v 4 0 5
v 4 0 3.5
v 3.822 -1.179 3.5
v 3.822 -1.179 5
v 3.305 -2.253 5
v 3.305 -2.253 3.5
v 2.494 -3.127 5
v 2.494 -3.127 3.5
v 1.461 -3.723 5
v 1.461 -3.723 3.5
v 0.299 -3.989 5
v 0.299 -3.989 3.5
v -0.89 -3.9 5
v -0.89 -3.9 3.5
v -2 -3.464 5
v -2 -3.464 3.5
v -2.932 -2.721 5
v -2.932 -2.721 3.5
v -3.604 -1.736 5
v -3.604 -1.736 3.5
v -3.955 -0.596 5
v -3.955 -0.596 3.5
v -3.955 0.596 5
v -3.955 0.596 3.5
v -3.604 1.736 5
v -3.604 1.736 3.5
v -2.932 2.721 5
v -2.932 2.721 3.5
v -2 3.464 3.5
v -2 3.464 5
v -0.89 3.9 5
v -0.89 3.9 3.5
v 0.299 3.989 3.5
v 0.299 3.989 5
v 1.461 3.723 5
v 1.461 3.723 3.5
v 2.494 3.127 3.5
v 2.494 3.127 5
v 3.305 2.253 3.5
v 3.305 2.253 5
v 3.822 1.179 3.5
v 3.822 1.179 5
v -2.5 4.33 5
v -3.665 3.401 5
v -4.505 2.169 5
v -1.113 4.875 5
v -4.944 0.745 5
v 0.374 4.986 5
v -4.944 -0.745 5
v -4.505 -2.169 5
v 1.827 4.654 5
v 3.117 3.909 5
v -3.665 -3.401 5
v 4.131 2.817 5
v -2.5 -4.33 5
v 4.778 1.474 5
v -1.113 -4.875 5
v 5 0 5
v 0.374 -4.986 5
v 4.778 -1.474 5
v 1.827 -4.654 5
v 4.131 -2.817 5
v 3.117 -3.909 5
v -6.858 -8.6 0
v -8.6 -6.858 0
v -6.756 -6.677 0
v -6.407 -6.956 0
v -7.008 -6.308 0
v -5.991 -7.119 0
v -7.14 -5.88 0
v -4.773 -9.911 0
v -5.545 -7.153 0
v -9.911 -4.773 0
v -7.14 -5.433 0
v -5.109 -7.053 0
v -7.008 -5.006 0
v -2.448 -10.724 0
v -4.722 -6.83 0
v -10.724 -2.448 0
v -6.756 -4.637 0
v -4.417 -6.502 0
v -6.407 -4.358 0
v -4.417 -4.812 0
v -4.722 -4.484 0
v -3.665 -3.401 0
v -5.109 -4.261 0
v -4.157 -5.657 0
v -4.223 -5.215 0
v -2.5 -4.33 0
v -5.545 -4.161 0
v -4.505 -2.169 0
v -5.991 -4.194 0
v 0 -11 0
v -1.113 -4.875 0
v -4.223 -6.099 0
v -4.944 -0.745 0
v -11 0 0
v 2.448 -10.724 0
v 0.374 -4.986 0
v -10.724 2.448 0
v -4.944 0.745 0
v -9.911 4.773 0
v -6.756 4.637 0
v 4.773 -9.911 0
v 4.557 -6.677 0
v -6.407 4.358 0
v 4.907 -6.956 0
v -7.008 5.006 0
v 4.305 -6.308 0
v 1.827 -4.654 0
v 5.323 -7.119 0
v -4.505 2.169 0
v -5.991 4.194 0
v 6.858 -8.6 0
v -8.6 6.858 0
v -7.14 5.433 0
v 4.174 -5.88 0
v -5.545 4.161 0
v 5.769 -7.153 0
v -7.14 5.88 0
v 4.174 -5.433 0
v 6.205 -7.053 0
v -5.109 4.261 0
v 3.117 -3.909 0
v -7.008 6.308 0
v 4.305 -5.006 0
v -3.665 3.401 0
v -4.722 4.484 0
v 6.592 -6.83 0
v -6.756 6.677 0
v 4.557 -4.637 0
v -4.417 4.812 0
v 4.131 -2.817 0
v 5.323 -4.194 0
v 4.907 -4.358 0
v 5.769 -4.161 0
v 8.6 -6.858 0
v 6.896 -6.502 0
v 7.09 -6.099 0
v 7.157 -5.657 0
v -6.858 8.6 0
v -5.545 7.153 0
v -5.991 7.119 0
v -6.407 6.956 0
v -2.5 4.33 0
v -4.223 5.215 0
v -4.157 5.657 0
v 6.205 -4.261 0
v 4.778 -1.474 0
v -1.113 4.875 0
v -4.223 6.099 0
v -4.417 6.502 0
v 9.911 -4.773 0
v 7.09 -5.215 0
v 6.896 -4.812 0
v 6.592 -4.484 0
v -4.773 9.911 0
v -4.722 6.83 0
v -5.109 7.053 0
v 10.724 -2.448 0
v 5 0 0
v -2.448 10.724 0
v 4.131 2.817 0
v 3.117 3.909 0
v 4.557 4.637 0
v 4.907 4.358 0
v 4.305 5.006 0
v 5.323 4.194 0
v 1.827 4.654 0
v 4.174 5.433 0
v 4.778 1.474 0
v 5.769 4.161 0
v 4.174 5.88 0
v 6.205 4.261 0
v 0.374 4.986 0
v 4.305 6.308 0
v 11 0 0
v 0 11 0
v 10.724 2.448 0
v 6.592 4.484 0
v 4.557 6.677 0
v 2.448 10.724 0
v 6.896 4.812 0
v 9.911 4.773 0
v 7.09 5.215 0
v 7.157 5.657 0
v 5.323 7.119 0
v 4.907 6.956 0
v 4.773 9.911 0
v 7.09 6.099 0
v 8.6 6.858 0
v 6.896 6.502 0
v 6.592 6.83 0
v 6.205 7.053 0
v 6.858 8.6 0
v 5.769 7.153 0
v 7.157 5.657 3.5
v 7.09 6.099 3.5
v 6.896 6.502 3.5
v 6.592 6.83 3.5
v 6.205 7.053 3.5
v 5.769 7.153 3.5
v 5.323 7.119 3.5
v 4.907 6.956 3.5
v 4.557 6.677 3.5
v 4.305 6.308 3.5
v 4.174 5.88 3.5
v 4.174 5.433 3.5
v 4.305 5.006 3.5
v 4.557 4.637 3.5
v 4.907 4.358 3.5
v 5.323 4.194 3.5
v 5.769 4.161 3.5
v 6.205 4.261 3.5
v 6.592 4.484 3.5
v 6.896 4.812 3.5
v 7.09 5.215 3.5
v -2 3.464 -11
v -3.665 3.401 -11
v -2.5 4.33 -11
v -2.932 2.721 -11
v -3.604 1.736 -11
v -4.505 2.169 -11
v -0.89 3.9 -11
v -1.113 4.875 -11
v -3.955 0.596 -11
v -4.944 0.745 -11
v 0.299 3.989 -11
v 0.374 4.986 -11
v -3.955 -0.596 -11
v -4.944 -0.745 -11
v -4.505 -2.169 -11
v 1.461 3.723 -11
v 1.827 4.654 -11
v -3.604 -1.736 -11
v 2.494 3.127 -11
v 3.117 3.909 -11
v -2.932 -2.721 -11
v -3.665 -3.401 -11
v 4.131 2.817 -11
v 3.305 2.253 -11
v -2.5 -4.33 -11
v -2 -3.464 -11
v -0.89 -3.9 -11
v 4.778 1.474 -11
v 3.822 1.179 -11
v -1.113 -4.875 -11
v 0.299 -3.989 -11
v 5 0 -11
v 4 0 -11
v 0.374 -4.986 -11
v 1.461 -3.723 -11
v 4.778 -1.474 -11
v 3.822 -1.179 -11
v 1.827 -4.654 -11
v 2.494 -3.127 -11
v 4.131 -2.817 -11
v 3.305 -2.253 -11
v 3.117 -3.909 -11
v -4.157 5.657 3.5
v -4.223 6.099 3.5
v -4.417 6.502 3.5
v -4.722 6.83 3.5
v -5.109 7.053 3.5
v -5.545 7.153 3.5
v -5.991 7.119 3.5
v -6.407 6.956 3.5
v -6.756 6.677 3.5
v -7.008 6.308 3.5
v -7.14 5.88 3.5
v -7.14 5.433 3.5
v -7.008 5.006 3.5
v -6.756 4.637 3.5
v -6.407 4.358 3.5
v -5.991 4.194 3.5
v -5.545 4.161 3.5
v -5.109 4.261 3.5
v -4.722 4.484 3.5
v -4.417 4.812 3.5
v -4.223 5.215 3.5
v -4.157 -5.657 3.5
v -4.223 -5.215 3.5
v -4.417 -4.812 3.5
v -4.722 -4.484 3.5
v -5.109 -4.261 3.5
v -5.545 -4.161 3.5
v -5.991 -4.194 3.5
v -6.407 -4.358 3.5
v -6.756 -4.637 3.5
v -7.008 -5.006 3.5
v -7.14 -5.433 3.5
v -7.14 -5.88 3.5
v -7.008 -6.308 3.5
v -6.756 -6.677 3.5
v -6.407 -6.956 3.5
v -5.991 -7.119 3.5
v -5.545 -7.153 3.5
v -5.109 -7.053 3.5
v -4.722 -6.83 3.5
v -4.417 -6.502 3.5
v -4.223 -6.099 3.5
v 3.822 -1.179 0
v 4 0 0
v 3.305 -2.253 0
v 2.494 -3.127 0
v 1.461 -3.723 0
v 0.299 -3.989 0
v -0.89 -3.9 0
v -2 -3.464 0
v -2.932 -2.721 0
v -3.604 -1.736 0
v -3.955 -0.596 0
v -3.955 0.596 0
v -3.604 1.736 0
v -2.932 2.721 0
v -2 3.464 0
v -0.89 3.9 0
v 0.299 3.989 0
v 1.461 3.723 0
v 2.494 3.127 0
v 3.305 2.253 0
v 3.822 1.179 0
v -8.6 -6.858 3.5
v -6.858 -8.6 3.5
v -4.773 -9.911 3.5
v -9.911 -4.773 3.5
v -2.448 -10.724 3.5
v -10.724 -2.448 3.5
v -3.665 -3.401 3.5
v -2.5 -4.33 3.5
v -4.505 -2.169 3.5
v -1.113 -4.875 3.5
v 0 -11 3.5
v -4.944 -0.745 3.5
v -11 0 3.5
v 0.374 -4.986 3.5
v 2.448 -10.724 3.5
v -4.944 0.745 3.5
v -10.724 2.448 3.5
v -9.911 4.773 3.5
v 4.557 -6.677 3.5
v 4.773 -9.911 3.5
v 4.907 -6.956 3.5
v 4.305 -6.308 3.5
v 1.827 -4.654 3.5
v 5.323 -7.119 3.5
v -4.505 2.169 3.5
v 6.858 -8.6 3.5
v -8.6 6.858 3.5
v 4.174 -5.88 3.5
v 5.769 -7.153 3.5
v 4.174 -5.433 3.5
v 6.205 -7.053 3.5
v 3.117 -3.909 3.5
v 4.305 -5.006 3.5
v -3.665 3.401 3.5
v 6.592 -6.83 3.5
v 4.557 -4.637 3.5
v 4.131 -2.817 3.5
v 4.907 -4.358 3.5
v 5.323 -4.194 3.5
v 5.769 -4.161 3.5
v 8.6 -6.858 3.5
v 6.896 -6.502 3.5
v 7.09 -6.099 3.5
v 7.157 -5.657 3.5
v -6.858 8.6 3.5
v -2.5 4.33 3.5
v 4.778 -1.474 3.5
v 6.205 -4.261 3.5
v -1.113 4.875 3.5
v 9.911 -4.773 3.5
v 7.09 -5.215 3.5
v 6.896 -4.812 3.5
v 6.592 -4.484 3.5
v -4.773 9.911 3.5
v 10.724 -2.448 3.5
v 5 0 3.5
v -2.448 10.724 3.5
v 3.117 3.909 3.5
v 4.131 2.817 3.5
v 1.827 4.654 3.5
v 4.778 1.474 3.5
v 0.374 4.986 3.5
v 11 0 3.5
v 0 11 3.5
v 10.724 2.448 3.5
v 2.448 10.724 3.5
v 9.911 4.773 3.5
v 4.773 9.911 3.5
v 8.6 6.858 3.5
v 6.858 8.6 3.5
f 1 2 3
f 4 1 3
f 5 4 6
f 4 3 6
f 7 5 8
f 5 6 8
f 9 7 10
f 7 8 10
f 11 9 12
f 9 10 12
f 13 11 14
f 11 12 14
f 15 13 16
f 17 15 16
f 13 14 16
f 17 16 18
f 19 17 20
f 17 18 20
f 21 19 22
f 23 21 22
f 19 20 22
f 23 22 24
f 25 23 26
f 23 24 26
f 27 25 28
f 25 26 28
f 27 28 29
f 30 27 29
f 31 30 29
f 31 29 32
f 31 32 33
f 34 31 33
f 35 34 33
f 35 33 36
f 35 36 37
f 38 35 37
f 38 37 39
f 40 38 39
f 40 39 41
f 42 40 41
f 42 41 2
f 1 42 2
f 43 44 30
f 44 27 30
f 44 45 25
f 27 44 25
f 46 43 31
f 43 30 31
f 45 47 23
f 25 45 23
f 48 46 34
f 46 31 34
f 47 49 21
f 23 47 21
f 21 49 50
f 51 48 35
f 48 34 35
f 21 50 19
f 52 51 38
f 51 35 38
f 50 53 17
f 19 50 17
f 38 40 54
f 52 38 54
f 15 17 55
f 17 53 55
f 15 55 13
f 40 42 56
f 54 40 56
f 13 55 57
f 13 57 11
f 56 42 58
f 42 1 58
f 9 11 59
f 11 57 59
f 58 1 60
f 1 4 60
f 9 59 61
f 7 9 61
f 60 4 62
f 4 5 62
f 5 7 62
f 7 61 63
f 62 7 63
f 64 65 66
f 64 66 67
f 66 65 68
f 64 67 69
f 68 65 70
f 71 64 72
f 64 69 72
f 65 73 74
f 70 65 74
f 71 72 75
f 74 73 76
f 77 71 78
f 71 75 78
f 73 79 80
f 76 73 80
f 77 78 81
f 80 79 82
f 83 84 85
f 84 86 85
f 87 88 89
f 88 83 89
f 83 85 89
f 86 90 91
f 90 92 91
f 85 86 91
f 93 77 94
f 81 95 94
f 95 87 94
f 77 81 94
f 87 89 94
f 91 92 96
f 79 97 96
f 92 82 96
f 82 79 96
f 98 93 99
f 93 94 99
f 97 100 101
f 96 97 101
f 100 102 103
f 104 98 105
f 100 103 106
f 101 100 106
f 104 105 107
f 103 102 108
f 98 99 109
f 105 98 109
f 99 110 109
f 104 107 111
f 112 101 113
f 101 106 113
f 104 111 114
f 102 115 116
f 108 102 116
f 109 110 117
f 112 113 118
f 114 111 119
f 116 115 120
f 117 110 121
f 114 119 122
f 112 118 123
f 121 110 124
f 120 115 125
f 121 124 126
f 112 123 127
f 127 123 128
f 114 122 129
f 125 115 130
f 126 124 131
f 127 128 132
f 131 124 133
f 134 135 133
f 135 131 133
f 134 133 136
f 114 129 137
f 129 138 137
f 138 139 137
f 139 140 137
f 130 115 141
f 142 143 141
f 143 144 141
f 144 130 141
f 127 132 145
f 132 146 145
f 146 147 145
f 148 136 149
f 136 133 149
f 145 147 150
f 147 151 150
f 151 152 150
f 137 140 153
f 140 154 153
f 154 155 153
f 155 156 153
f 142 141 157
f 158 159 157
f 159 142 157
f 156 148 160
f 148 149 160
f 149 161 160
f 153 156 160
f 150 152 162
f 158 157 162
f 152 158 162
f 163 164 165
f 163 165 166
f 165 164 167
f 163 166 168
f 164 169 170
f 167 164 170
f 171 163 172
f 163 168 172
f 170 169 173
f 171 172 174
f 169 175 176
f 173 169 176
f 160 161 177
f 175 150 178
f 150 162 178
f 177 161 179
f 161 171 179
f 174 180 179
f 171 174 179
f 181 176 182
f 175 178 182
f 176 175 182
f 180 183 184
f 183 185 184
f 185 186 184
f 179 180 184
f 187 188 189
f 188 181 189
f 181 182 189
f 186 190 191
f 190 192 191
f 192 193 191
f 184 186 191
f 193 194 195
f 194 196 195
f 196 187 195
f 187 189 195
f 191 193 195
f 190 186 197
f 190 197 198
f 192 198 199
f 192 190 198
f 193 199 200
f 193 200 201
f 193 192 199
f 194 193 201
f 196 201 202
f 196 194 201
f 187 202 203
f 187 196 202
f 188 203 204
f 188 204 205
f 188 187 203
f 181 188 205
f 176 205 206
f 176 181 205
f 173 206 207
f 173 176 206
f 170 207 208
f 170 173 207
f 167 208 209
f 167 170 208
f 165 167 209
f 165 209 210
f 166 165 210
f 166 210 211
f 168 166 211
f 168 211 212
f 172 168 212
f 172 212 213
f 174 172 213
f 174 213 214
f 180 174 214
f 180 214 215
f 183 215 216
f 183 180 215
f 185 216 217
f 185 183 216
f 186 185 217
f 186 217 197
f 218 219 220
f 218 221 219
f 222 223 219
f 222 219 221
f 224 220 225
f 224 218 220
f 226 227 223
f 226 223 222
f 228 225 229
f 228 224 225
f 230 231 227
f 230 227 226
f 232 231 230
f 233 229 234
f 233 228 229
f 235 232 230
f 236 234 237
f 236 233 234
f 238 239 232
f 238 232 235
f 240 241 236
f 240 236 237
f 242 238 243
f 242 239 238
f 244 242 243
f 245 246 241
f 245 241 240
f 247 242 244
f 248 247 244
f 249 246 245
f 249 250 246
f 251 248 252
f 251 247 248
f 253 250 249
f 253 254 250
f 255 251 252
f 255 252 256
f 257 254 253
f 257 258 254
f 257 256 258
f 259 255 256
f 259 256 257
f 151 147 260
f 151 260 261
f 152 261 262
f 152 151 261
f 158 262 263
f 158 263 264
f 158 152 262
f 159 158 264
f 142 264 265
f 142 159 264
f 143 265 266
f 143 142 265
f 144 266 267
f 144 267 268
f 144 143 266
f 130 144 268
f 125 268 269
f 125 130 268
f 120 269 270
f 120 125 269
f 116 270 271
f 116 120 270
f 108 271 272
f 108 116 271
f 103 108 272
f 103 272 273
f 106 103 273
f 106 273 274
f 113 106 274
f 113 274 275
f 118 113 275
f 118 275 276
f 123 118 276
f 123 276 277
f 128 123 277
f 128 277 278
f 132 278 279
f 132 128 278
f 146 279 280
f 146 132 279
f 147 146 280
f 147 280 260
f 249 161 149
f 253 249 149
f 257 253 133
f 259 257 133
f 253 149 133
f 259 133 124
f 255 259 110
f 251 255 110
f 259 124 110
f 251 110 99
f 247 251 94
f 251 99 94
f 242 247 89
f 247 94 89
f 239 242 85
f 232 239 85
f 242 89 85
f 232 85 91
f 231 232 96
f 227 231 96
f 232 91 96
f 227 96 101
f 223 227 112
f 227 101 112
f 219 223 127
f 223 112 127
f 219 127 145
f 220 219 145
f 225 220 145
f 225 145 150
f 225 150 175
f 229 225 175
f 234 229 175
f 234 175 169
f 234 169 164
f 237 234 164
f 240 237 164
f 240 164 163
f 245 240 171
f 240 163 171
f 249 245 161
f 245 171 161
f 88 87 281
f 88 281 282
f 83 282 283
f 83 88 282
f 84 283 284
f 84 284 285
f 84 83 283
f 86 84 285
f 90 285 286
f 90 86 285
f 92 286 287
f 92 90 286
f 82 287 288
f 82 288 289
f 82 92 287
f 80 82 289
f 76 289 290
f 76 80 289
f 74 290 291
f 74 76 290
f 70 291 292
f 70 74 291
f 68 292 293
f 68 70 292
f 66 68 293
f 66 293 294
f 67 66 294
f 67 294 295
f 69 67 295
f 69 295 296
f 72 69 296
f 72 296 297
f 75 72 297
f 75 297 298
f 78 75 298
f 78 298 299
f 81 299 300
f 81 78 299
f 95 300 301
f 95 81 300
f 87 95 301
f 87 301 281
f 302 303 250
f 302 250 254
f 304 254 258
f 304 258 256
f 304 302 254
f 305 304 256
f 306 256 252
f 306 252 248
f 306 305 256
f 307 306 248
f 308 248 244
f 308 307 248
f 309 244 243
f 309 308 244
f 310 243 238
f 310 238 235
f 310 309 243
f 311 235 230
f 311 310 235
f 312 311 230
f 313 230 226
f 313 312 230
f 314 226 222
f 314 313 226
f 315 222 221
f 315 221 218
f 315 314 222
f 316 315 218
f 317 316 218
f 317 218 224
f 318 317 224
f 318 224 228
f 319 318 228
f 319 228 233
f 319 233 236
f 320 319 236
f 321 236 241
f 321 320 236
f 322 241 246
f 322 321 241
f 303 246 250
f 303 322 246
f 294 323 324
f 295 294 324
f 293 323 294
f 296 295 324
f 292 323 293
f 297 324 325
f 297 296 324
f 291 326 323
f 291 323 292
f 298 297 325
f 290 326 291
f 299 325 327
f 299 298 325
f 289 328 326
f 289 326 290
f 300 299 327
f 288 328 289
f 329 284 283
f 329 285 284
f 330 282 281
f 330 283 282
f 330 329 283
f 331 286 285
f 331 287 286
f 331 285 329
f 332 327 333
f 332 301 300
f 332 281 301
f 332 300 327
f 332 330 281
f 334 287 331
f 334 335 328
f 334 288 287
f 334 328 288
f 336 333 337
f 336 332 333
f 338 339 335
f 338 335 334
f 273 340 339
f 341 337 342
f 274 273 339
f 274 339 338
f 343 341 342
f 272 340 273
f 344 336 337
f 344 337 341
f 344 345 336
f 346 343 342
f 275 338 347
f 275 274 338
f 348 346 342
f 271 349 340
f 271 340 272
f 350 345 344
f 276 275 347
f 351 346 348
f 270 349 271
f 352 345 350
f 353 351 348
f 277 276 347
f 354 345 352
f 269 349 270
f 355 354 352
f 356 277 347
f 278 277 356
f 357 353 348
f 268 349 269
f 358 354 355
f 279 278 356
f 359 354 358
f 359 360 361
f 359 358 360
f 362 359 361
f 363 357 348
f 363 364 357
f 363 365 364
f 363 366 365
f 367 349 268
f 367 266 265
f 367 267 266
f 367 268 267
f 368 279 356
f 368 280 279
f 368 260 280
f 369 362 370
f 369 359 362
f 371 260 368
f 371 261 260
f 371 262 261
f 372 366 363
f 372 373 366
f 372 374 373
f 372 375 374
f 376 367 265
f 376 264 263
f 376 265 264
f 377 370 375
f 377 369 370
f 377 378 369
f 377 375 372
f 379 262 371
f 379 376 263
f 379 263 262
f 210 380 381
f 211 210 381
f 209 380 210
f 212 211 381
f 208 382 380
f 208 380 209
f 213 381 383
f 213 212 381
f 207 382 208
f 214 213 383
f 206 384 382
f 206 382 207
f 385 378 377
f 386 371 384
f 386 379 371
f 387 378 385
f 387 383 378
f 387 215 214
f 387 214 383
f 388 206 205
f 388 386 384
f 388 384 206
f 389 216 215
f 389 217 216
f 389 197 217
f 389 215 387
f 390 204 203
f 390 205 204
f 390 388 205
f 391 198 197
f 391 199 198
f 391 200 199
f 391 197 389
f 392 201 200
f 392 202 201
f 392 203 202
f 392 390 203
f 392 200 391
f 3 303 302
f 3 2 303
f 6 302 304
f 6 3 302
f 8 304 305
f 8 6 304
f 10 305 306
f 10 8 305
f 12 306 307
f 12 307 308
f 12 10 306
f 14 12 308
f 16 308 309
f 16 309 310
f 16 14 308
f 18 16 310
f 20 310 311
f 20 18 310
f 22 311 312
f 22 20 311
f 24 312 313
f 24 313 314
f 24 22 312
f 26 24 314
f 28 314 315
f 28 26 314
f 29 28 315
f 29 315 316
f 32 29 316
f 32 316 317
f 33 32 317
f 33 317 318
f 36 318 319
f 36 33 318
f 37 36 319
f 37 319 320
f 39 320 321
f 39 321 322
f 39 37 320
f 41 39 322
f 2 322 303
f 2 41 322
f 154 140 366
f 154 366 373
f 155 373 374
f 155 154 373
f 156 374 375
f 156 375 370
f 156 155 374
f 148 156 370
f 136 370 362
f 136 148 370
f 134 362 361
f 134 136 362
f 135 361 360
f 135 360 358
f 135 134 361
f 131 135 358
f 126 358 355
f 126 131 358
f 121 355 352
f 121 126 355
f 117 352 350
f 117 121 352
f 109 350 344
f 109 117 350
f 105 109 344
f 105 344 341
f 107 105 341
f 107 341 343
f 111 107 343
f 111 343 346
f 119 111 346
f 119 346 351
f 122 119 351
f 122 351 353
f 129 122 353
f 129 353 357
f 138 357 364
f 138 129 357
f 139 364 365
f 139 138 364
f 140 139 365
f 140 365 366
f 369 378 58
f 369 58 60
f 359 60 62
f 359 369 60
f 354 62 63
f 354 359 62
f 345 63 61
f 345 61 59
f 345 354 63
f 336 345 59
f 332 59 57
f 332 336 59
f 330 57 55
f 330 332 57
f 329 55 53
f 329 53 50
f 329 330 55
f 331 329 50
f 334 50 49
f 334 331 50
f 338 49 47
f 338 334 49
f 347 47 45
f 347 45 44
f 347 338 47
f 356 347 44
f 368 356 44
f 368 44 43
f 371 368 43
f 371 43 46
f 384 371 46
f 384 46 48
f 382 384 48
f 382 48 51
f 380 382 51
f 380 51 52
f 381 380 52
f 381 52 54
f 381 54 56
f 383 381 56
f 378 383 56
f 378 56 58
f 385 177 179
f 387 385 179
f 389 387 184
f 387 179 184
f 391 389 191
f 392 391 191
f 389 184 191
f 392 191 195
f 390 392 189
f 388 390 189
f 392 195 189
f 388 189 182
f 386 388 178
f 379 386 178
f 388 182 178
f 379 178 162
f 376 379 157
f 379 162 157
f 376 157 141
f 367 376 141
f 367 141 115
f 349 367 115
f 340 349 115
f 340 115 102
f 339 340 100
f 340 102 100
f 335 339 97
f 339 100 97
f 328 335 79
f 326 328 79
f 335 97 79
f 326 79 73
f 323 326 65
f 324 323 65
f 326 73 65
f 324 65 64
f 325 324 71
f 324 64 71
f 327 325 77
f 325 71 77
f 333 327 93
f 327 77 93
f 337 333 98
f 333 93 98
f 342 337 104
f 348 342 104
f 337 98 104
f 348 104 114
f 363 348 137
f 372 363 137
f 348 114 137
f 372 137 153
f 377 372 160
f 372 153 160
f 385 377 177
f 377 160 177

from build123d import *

# Parameters (mm, degrees)
F0_R          = 11
F0_R_2        = 1.5
F0_R_3        = 4
F1_DEPTH      = 3.5
F2_R          = 5
F2_R_2        = 4
F3_DEPTH      = 11
F3_DEPTH_BACK = 5


with BuildPart() as f1:
    # F0 (on Top) → F1 (new body)
    with BuildSketch(Plane.XY):
        Circle(F0_R)
        with Locations((-5.656854, -5.656854)):
            Circle(F0_R_2, mode=Mode.SUBTRACT)
        with Locations((5.656854, -5.656854)):
            Circle(F0_R_2, mode=Mode.SUBTRACT)
        with Locations((-5.656854, 5.656854)):
            Circle(F0_R_2, mode=Mode.SUBTRACT)
        Circle(F0_R_3, mode=Mode.SUBTRACT)
        with Locations((5.656854, 5.656854)):
            Circle(F0_R_2, mode=Mode.SUBTRACT)
    extrude(amount=F1_DEPTH)

    # F2 (on face) → F3 (join, two sides)
    with BuildSketch(Plane(origin=(0, 0, 0), x_dir=(1, 0, 0), z_dir=(0, 0, -1))) as f3_sk:
        Circle(F2_R)
        Circle(F2_R_2, mode=Mode.SUBTRACT)
    extrude(amount=F3_DEPTH)
    extrude(f3_sk.sketch, amount=-F3_DEPTH_BACK)


solid = f1.part
